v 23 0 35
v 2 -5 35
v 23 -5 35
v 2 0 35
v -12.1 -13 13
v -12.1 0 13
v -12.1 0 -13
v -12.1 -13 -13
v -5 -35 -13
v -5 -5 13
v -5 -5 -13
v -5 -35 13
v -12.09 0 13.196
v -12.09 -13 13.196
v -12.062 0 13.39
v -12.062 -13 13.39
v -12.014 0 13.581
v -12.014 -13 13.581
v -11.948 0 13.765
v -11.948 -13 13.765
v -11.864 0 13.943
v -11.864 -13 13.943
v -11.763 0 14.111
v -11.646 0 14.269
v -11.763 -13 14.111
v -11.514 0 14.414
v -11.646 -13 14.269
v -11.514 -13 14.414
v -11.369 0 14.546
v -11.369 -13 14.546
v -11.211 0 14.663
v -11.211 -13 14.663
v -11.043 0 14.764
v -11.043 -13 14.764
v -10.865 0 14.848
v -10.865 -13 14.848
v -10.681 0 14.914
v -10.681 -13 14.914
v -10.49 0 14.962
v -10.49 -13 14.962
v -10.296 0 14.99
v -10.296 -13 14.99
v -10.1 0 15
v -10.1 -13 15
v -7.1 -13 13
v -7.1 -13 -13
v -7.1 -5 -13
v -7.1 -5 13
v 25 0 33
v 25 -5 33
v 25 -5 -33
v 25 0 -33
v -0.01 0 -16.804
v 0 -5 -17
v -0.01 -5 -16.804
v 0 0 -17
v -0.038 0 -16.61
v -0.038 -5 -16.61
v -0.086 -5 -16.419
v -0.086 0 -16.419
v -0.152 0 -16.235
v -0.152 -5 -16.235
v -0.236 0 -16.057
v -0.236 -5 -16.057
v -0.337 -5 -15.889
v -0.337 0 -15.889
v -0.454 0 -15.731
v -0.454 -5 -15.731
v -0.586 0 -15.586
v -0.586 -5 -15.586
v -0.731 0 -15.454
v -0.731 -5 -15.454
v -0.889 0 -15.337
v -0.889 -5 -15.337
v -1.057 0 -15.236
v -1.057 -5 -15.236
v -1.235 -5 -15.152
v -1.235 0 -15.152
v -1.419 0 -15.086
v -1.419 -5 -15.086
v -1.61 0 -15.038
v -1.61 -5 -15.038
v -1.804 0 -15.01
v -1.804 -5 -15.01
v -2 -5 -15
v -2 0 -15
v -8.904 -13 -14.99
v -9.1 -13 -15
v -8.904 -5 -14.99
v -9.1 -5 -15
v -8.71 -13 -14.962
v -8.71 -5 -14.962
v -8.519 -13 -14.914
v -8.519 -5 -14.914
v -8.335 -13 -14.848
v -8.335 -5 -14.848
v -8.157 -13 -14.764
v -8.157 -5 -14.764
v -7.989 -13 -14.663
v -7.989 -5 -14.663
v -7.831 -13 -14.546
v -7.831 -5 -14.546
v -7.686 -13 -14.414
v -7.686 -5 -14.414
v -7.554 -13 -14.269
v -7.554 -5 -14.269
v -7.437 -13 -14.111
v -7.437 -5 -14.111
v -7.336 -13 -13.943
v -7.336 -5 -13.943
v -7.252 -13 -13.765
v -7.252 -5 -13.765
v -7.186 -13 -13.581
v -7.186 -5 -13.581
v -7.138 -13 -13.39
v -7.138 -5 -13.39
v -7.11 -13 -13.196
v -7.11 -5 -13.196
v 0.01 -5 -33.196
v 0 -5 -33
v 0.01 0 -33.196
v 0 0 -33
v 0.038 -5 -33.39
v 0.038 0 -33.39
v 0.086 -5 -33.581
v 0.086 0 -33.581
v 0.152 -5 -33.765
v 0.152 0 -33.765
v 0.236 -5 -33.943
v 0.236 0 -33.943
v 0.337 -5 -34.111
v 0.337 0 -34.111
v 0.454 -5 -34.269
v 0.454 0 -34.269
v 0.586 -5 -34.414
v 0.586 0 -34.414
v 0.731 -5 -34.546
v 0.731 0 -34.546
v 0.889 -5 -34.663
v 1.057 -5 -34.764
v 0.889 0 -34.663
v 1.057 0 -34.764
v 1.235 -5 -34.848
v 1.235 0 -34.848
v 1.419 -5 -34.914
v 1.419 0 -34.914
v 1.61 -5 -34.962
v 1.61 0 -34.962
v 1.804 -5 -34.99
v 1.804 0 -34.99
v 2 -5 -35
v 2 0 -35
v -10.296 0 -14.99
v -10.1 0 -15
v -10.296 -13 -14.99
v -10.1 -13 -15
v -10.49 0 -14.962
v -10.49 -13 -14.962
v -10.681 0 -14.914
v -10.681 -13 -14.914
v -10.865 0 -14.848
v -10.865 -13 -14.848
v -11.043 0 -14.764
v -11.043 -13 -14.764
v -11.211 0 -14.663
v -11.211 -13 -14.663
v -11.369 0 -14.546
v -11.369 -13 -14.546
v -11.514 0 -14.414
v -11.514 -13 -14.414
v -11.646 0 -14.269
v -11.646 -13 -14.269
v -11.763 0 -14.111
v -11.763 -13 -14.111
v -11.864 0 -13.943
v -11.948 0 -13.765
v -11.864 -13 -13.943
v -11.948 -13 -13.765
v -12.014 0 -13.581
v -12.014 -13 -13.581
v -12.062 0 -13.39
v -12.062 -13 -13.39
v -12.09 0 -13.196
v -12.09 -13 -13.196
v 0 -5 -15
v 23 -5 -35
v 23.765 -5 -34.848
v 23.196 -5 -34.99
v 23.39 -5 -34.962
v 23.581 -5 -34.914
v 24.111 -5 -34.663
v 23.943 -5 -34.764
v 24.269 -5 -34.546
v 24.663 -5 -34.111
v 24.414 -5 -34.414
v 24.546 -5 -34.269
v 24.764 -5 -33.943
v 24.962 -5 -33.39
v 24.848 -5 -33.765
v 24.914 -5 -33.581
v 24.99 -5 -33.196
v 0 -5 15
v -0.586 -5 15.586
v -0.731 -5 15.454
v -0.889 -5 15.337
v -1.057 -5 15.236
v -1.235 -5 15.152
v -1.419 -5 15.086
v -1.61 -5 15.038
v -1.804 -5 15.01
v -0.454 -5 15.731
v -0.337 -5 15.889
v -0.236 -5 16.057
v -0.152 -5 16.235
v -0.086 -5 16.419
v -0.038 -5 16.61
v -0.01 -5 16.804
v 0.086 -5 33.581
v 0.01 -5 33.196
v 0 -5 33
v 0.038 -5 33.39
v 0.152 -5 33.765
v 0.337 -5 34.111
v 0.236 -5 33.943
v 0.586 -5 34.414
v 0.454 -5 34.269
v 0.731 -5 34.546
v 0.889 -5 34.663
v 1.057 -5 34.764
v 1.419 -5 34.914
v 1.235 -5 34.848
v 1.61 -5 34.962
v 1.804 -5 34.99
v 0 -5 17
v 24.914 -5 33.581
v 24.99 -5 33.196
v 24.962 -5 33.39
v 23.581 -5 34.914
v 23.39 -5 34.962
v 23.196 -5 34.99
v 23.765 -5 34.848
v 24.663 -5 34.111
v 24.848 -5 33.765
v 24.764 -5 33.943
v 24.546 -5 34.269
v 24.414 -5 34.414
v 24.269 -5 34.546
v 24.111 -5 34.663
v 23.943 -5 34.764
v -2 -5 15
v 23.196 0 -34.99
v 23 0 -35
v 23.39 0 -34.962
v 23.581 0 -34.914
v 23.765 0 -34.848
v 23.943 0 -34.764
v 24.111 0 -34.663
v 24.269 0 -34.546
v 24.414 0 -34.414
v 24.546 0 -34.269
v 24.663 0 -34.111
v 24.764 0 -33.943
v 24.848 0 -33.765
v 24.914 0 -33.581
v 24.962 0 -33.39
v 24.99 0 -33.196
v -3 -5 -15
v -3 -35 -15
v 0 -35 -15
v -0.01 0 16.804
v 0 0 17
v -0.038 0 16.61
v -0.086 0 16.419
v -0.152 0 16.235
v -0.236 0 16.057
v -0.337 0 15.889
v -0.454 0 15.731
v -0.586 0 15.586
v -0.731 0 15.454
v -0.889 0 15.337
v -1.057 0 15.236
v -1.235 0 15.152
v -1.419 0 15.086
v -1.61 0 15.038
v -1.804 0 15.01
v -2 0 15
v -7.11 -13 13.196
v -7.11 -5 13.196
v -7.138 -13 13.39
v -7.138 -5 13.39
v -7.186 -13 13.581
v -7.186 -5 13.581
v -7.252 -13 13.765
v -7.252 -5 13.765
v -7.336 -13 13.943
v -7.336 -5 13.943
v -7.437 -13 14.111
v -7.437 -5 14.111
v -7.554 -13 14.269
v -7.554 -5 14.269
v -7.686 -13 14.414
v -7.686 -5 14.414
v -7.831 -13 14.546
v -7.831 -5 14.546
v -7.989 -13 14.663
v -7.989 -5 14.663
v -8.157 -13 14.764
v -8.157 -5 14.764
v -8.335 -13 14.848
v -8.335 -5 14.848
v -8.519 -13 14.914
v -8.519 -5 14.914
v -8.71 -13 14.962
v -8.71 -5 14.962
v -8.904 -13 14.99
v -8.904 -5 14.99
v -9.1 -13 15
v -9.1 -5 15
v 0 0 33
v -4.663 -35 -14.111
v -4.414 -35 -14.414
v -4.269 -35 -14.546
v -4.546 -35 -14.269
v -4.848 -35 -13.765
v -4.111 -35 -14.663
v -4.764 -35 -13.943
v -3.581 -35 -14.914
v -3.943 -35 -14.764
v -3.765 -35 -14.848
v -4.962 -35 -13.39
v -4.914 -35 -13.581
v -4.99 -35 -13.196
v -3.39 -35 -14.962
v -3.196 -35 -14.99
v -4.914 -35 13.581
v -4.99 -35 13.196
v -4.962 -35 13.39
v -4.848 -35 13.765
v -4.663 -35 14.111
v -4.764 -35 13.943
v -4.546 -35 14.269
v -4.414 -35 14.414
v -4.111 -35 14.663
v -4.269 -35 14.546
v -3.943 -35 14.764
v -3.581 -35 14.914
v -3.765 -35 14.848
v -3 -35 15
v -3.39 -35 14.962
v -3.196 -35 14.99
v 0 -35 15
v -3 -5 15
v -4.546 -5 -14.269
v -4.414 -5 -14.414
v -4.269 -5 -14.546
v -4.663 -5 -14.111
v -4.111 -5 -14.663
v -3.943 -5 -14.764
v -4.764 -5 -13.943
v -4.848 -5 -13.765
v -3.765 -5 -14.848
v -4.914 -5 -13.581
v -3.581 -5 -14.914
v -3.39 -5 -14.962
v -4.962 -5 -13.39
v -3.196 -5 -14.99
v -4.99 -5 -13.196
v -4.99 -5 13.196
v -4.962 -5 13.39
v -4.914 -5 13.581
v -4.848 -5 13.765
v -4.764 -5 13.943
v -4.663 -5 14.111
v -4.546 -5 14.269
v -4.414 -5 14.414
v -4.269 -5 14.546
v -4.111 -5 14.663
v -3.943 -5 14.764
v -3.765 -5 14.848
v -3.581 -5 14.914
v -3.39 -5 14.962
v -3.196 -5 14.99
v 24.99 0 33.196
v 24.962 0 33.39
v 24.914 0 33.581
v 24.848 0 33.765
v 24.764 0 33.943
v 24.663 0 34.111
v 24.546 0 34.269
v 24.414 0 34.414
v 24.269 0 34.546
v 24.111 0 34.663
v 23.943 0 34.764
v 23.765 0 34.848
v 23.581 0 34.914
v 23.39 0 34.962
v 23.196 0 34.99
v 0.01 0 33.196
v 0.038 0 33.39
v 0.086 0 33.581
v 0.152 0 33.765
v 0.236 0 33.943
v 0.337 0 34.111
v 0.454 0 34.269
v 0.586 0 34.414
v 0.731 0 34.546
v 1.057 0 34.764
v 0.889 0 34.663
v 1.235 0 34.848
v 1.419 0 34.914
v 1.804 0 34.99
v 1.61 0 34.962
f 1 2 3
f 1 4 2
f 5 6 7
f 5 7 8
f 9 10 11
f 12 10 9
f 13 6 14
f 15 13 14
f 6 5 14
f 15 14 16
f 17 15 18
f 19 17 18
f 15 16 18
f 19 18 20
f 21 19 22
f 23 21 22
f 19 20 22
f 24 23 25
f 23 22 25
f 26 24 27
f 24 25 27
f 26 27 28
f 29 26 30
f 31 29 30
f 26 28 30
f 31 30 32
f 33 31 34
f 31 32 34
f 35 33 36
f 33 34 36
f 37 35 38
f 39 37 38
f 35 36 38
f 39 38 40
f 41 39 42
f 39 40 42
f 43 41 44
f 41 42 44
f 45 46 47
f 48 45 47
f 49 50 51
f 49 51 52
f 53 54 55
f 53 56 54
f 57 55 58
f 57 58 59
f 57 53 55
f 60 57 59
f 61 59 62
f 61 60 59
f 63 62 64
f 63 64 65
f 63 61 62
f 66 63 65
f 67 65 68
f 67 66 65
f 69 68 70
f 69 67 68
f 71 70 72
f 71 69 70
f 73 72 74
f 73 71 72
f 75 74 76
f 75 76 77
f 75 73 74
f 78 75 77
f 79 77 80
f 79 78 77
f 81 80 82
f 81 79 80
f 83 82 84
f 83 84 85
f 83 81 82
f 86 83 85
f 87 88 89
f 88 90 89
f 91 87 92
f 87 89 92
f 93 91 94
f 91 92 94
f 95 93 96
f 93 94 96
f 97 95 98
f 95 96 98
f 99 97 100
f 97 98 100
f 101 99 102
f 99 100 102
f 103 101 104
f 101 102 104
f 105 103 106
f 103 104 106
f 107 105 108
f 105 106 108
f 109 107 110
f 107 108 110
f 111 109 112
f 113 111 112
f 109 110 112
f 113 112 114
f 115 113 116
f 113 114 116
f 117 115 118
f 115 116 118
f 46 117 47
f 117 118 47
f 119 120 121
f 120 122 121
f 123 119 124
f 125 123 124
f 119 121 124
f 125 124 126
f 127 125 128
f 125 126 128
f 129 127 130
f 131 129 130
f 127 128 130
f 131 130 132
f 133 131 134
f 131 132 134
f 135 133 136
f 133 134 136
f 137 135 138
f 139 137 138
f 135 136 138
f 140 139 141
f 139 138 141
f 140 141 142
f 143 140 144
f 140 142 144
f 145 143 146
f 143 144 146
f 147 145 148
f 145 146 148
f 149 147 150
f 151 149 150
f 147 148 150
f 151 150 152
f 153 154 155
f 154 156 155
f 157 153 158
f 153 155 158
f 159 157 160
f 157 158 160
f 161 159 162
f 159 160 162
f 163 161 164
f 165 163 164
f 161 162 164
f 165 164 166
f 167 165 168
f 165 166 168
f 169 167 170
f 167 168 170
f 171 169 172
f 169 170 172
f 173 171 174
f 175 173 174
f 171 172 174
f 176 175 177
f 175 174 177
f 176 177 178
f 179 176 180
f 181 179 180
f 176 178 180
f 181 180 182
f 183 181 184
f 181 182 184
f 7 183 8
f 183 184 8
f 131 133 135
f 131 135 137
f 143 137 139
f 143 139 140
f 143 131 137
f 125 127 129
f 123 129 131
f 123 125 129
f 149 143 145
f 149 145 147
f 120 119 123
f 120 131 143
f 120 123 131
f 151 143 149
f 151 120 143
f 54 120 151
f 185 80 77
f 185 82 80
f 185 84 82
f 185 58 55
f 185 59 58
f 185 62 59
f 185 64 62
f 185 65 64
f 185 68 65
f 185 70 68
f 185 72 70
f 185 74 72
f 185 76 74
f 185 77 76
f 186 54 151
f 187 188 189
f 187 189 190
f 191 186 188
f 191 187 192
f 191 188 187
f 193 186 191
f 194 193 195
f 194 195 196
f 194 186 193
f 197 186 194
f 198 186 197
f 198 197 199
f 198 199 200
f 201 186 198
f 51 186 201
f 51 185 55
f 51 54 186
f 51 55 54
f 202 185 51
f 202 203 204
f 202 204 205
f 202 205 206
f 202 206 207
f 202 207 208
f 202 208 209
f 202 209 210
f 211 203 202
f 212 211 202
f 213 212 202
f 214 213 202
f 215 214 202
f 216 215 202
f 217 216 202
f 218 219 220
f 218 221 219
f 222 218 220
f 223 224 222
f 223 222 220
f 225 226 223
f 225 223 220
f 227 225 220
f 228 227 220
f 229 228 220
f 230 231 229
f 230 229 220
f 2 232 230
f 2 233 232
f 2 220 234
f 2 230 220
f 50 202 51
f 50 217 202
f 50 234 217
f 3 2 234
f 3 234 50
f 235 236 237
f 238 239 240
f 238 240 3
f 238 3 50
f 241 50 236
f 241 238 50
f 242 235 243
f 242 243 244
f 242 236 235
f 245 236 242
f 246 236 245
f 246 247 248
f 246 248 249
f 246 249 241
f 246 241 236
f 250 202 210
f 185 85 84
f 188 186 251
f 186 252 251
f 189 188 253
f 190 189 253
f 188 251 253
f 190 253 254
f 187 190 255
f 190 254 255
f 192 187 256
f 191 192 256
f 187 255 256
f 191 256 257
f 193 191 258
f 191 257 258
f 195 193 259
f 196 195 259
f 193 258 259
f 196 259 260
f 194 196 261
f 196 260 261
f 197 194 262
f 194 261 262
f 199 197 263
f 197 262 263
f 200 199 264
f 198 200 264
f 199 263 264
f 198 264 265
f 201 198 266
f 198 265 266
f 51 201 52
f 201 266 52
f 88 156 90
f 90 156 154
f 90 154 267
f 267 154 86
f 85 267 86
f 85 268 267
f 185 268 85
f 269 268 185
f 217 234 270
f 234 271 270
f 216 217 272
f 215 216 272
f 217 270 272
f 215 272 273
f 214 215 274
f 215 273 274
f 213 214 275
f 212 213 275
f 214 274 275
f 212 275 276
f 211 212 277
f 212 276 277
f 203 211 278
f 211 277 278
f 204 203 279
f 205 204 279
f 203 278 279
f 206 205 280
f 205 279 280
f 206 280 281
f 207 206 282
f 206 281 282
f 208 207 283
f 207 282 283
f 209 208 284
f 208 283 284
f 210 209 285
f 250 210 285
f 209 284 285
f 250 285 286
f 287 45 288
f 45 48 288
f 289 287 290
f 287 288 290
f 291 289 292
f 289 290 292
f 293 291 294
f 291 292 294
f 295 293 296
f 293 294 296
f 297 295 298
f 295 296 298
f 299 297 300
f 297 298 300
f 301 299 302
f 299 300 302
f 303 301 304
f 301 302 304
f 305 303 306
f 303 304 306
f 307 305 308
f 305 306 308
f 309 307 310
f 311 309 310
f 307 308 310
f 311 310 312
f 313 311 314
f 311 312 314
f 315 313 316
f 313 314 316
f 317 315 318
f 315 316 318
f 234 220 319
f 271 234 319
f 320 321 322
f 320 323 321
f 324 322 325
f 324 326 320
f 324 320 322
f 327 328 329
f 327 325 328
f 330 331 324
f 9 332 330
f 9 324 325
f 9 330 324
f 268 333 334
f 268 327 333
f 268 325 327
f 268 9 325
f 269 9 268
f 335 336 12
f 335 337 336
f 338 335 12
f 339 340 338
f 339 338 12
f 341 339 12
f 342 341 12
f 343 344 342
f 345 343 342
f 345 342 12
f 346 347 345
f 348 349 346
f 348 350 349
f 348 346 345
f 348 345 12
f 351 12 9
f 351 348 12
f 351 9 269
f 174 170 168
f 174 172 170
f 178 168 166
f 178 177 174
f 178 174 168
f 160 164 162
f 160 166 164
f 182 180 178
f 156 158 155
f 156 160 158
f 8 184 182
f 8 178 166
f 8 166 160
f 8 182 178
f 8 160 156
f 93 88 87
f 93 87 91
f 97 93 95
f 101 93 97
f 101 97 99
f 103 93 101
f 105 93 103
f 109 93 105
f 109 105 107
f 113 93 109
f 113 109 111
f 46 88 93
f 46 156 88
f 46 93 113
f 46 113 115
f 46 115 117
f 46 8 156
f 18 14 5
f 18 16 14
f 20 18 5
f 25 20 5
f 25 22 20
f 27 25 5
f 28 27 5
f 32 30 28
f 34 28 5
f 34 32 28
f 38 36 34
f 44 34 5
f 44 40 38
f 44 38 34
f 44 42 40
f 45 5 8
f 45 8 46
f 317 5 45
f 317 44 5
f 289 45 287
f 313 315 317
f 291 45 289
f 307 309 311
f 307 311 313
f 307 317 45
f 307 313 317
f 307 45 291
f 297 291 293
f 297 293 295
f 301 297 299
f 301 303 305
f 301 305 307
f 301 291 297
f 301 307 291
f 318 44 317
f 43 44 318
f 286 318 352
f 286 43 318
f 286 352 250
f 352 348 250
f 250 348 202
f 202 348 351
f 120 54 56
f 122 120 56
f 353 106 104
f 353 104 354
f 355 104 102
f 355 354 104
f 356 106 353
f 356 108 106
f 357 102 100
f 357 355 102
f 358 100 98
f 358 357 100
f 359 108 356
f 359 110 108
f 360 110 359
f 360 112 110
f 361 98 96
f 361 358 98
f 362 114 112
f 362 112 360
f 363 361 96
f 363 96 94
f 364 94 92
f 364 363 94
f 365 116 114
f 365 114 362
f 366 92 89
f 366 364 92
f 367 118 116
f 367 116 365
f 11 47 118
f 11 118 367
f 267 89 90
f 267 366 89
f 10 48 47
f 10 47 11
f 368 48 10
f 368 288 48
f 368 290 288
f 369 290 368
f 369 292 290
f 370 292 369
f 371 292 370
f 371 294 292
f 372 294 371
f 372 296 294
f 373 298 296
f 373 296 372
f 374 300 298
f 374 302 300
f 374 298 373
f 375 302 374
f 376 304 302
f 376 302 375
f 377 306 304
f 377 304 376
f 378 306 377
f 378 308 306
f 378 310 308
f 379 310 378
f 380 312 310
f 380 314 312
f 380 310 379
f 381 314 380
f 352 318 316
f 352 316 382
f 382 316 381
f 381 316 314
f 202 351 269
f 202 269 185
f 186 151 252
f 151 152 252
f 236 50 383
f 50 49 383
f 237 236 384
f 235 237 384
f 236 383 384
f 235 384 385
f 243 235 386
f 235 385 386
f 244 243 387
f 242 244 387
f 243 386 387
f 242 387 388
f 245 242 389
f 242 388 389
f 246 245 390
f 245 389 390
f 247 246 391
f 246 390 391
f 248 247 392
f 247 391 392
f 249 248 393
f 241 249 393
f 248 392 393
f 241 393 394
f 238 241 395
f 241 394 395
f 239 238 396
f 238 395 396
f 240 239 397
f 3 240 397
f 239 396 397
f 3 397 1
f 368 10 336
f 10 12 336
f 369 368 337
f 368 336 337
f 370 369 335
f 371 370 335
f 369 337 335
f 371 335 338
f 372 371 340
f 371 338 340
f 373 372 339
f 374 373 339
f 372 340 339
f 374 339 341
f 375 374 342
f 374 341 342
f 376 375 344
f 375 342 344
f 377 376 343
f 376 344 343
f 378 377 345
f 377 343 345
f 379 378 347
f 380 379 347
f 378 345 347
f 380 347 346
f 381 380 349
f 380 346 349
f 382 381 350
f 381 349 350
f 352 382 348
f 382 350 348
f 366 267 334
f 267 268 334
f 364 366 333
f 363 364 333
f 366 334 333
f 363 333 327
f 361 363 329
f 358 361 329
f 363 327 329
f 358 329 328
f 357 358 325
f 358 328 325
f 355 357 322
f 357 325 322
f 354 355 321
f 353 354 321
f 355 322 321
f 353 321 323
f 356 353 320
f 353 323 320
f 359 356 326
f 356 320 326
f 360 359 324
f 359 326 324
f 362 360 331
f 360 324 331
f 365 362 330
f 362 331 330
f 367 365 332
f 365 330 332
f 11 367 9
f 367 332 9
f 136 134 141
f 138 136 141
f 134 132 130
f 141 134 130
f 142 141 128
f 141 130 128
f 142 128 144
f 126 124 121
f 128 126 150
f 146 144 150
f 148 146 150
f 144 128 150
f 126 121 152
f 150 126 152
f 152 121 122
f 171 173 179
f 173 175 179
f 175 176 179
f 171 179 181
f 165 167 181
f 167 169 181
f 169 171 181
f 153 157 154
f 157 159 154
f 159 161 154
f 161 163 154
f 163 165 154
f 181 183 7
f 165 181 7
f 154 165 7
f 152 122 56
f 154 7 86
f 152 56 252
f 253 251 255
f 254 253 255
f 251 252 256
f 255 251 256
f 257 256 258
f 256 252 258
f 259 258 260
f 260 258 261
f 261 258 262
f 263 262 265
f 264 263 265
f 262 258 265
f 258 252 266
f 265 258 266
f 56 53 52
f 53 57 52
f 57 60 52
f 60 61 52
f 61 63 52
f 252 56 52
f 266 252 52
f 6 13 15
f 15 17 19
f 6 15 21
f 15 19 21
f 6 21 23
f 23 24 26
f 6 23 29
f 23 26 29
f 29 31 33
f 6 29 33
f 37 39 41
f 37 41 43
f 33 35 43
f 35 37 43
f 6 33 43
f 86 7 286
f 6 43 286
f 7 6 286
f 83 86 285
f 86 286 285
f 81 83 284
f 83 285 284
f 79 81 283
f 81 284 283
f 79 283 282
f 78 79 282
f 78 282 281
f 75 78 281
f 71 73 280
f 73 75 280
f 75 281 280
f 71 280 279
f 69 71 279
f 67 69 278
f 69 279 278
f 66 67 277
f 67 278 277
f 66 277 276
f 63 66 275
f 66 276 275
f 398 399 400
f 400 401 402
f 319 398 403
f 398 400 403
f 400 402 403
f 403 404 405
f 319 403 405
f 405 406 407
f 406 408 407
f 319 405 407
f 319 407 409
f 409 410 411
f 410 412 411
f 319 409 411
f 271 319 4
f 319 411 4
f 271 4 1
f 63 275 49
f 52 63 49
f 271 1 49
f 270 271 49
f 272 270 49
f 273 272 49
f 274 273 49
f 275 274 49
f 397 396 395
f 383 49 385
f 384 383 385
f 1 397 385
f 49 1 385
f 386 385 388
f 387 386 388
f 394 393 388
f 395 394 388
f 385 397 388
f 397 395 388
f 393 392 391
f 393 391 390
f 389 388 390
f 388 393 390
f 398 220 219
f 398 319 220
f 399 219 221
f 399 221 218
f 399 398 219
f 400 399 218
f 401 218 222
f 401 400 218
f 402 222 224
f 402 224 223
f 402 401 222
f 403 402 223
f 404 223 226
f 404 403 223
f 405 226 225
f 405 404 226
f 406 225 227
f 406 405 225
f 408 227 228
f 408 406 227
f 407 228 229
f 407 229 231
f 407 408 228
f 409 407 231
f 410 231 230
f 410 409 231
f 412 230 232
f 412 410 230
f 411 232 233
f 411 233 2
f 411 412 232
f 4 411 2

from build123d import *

# Parameters (mm, degrees)
F1_DEPTH = 15
F0_W     = 25
F0_H     = 5
F2_DEPTH = 35
F3_R     = 2


with BuildPart() as f1:
    # F0 (on Top) → F1 (new body, symmetric)
    with BuildSketch(Plane.XY):
        Polygon((-12.1, 0), (-12.1, -13), (-7.1, -13), (-7.1, -5), (-5, -5), (-5, -35), (0, -35), (0, -5), (0, 0), align=None)
    extrude(amount=F1_DEPTH, both=True)

    # F0 (on Top) → F2 (join, symmetric)
    with BuildSketch(Plane.XY):
        with Locations((12.5, -2.5)):
            Rectangle(F0_W, F0_H)
    extrude(amount=F2_DEPTH, both=True)

    # F3
    f3_edges = [f1.edges().sort_by_distance(p)[0] for p in [
        (0, -2.5, 15),
        (0, -2.5, -15),
        (0, -2.5, -35),
        (0, -2.5, 35),
        (25, -2.5, 35),
        (25, -2.5, -35),
        (-12.1, -6.5, 15),
        (-5, -20, 15),
        (-7.1, -9, 15),
        (-5, -20, -15),
        (-12.1, -6.5, -15),
        (-7.1, -9, -15),
    ]]
    fillet(f3_edges, radius=F3_R)


solid = f1.part
